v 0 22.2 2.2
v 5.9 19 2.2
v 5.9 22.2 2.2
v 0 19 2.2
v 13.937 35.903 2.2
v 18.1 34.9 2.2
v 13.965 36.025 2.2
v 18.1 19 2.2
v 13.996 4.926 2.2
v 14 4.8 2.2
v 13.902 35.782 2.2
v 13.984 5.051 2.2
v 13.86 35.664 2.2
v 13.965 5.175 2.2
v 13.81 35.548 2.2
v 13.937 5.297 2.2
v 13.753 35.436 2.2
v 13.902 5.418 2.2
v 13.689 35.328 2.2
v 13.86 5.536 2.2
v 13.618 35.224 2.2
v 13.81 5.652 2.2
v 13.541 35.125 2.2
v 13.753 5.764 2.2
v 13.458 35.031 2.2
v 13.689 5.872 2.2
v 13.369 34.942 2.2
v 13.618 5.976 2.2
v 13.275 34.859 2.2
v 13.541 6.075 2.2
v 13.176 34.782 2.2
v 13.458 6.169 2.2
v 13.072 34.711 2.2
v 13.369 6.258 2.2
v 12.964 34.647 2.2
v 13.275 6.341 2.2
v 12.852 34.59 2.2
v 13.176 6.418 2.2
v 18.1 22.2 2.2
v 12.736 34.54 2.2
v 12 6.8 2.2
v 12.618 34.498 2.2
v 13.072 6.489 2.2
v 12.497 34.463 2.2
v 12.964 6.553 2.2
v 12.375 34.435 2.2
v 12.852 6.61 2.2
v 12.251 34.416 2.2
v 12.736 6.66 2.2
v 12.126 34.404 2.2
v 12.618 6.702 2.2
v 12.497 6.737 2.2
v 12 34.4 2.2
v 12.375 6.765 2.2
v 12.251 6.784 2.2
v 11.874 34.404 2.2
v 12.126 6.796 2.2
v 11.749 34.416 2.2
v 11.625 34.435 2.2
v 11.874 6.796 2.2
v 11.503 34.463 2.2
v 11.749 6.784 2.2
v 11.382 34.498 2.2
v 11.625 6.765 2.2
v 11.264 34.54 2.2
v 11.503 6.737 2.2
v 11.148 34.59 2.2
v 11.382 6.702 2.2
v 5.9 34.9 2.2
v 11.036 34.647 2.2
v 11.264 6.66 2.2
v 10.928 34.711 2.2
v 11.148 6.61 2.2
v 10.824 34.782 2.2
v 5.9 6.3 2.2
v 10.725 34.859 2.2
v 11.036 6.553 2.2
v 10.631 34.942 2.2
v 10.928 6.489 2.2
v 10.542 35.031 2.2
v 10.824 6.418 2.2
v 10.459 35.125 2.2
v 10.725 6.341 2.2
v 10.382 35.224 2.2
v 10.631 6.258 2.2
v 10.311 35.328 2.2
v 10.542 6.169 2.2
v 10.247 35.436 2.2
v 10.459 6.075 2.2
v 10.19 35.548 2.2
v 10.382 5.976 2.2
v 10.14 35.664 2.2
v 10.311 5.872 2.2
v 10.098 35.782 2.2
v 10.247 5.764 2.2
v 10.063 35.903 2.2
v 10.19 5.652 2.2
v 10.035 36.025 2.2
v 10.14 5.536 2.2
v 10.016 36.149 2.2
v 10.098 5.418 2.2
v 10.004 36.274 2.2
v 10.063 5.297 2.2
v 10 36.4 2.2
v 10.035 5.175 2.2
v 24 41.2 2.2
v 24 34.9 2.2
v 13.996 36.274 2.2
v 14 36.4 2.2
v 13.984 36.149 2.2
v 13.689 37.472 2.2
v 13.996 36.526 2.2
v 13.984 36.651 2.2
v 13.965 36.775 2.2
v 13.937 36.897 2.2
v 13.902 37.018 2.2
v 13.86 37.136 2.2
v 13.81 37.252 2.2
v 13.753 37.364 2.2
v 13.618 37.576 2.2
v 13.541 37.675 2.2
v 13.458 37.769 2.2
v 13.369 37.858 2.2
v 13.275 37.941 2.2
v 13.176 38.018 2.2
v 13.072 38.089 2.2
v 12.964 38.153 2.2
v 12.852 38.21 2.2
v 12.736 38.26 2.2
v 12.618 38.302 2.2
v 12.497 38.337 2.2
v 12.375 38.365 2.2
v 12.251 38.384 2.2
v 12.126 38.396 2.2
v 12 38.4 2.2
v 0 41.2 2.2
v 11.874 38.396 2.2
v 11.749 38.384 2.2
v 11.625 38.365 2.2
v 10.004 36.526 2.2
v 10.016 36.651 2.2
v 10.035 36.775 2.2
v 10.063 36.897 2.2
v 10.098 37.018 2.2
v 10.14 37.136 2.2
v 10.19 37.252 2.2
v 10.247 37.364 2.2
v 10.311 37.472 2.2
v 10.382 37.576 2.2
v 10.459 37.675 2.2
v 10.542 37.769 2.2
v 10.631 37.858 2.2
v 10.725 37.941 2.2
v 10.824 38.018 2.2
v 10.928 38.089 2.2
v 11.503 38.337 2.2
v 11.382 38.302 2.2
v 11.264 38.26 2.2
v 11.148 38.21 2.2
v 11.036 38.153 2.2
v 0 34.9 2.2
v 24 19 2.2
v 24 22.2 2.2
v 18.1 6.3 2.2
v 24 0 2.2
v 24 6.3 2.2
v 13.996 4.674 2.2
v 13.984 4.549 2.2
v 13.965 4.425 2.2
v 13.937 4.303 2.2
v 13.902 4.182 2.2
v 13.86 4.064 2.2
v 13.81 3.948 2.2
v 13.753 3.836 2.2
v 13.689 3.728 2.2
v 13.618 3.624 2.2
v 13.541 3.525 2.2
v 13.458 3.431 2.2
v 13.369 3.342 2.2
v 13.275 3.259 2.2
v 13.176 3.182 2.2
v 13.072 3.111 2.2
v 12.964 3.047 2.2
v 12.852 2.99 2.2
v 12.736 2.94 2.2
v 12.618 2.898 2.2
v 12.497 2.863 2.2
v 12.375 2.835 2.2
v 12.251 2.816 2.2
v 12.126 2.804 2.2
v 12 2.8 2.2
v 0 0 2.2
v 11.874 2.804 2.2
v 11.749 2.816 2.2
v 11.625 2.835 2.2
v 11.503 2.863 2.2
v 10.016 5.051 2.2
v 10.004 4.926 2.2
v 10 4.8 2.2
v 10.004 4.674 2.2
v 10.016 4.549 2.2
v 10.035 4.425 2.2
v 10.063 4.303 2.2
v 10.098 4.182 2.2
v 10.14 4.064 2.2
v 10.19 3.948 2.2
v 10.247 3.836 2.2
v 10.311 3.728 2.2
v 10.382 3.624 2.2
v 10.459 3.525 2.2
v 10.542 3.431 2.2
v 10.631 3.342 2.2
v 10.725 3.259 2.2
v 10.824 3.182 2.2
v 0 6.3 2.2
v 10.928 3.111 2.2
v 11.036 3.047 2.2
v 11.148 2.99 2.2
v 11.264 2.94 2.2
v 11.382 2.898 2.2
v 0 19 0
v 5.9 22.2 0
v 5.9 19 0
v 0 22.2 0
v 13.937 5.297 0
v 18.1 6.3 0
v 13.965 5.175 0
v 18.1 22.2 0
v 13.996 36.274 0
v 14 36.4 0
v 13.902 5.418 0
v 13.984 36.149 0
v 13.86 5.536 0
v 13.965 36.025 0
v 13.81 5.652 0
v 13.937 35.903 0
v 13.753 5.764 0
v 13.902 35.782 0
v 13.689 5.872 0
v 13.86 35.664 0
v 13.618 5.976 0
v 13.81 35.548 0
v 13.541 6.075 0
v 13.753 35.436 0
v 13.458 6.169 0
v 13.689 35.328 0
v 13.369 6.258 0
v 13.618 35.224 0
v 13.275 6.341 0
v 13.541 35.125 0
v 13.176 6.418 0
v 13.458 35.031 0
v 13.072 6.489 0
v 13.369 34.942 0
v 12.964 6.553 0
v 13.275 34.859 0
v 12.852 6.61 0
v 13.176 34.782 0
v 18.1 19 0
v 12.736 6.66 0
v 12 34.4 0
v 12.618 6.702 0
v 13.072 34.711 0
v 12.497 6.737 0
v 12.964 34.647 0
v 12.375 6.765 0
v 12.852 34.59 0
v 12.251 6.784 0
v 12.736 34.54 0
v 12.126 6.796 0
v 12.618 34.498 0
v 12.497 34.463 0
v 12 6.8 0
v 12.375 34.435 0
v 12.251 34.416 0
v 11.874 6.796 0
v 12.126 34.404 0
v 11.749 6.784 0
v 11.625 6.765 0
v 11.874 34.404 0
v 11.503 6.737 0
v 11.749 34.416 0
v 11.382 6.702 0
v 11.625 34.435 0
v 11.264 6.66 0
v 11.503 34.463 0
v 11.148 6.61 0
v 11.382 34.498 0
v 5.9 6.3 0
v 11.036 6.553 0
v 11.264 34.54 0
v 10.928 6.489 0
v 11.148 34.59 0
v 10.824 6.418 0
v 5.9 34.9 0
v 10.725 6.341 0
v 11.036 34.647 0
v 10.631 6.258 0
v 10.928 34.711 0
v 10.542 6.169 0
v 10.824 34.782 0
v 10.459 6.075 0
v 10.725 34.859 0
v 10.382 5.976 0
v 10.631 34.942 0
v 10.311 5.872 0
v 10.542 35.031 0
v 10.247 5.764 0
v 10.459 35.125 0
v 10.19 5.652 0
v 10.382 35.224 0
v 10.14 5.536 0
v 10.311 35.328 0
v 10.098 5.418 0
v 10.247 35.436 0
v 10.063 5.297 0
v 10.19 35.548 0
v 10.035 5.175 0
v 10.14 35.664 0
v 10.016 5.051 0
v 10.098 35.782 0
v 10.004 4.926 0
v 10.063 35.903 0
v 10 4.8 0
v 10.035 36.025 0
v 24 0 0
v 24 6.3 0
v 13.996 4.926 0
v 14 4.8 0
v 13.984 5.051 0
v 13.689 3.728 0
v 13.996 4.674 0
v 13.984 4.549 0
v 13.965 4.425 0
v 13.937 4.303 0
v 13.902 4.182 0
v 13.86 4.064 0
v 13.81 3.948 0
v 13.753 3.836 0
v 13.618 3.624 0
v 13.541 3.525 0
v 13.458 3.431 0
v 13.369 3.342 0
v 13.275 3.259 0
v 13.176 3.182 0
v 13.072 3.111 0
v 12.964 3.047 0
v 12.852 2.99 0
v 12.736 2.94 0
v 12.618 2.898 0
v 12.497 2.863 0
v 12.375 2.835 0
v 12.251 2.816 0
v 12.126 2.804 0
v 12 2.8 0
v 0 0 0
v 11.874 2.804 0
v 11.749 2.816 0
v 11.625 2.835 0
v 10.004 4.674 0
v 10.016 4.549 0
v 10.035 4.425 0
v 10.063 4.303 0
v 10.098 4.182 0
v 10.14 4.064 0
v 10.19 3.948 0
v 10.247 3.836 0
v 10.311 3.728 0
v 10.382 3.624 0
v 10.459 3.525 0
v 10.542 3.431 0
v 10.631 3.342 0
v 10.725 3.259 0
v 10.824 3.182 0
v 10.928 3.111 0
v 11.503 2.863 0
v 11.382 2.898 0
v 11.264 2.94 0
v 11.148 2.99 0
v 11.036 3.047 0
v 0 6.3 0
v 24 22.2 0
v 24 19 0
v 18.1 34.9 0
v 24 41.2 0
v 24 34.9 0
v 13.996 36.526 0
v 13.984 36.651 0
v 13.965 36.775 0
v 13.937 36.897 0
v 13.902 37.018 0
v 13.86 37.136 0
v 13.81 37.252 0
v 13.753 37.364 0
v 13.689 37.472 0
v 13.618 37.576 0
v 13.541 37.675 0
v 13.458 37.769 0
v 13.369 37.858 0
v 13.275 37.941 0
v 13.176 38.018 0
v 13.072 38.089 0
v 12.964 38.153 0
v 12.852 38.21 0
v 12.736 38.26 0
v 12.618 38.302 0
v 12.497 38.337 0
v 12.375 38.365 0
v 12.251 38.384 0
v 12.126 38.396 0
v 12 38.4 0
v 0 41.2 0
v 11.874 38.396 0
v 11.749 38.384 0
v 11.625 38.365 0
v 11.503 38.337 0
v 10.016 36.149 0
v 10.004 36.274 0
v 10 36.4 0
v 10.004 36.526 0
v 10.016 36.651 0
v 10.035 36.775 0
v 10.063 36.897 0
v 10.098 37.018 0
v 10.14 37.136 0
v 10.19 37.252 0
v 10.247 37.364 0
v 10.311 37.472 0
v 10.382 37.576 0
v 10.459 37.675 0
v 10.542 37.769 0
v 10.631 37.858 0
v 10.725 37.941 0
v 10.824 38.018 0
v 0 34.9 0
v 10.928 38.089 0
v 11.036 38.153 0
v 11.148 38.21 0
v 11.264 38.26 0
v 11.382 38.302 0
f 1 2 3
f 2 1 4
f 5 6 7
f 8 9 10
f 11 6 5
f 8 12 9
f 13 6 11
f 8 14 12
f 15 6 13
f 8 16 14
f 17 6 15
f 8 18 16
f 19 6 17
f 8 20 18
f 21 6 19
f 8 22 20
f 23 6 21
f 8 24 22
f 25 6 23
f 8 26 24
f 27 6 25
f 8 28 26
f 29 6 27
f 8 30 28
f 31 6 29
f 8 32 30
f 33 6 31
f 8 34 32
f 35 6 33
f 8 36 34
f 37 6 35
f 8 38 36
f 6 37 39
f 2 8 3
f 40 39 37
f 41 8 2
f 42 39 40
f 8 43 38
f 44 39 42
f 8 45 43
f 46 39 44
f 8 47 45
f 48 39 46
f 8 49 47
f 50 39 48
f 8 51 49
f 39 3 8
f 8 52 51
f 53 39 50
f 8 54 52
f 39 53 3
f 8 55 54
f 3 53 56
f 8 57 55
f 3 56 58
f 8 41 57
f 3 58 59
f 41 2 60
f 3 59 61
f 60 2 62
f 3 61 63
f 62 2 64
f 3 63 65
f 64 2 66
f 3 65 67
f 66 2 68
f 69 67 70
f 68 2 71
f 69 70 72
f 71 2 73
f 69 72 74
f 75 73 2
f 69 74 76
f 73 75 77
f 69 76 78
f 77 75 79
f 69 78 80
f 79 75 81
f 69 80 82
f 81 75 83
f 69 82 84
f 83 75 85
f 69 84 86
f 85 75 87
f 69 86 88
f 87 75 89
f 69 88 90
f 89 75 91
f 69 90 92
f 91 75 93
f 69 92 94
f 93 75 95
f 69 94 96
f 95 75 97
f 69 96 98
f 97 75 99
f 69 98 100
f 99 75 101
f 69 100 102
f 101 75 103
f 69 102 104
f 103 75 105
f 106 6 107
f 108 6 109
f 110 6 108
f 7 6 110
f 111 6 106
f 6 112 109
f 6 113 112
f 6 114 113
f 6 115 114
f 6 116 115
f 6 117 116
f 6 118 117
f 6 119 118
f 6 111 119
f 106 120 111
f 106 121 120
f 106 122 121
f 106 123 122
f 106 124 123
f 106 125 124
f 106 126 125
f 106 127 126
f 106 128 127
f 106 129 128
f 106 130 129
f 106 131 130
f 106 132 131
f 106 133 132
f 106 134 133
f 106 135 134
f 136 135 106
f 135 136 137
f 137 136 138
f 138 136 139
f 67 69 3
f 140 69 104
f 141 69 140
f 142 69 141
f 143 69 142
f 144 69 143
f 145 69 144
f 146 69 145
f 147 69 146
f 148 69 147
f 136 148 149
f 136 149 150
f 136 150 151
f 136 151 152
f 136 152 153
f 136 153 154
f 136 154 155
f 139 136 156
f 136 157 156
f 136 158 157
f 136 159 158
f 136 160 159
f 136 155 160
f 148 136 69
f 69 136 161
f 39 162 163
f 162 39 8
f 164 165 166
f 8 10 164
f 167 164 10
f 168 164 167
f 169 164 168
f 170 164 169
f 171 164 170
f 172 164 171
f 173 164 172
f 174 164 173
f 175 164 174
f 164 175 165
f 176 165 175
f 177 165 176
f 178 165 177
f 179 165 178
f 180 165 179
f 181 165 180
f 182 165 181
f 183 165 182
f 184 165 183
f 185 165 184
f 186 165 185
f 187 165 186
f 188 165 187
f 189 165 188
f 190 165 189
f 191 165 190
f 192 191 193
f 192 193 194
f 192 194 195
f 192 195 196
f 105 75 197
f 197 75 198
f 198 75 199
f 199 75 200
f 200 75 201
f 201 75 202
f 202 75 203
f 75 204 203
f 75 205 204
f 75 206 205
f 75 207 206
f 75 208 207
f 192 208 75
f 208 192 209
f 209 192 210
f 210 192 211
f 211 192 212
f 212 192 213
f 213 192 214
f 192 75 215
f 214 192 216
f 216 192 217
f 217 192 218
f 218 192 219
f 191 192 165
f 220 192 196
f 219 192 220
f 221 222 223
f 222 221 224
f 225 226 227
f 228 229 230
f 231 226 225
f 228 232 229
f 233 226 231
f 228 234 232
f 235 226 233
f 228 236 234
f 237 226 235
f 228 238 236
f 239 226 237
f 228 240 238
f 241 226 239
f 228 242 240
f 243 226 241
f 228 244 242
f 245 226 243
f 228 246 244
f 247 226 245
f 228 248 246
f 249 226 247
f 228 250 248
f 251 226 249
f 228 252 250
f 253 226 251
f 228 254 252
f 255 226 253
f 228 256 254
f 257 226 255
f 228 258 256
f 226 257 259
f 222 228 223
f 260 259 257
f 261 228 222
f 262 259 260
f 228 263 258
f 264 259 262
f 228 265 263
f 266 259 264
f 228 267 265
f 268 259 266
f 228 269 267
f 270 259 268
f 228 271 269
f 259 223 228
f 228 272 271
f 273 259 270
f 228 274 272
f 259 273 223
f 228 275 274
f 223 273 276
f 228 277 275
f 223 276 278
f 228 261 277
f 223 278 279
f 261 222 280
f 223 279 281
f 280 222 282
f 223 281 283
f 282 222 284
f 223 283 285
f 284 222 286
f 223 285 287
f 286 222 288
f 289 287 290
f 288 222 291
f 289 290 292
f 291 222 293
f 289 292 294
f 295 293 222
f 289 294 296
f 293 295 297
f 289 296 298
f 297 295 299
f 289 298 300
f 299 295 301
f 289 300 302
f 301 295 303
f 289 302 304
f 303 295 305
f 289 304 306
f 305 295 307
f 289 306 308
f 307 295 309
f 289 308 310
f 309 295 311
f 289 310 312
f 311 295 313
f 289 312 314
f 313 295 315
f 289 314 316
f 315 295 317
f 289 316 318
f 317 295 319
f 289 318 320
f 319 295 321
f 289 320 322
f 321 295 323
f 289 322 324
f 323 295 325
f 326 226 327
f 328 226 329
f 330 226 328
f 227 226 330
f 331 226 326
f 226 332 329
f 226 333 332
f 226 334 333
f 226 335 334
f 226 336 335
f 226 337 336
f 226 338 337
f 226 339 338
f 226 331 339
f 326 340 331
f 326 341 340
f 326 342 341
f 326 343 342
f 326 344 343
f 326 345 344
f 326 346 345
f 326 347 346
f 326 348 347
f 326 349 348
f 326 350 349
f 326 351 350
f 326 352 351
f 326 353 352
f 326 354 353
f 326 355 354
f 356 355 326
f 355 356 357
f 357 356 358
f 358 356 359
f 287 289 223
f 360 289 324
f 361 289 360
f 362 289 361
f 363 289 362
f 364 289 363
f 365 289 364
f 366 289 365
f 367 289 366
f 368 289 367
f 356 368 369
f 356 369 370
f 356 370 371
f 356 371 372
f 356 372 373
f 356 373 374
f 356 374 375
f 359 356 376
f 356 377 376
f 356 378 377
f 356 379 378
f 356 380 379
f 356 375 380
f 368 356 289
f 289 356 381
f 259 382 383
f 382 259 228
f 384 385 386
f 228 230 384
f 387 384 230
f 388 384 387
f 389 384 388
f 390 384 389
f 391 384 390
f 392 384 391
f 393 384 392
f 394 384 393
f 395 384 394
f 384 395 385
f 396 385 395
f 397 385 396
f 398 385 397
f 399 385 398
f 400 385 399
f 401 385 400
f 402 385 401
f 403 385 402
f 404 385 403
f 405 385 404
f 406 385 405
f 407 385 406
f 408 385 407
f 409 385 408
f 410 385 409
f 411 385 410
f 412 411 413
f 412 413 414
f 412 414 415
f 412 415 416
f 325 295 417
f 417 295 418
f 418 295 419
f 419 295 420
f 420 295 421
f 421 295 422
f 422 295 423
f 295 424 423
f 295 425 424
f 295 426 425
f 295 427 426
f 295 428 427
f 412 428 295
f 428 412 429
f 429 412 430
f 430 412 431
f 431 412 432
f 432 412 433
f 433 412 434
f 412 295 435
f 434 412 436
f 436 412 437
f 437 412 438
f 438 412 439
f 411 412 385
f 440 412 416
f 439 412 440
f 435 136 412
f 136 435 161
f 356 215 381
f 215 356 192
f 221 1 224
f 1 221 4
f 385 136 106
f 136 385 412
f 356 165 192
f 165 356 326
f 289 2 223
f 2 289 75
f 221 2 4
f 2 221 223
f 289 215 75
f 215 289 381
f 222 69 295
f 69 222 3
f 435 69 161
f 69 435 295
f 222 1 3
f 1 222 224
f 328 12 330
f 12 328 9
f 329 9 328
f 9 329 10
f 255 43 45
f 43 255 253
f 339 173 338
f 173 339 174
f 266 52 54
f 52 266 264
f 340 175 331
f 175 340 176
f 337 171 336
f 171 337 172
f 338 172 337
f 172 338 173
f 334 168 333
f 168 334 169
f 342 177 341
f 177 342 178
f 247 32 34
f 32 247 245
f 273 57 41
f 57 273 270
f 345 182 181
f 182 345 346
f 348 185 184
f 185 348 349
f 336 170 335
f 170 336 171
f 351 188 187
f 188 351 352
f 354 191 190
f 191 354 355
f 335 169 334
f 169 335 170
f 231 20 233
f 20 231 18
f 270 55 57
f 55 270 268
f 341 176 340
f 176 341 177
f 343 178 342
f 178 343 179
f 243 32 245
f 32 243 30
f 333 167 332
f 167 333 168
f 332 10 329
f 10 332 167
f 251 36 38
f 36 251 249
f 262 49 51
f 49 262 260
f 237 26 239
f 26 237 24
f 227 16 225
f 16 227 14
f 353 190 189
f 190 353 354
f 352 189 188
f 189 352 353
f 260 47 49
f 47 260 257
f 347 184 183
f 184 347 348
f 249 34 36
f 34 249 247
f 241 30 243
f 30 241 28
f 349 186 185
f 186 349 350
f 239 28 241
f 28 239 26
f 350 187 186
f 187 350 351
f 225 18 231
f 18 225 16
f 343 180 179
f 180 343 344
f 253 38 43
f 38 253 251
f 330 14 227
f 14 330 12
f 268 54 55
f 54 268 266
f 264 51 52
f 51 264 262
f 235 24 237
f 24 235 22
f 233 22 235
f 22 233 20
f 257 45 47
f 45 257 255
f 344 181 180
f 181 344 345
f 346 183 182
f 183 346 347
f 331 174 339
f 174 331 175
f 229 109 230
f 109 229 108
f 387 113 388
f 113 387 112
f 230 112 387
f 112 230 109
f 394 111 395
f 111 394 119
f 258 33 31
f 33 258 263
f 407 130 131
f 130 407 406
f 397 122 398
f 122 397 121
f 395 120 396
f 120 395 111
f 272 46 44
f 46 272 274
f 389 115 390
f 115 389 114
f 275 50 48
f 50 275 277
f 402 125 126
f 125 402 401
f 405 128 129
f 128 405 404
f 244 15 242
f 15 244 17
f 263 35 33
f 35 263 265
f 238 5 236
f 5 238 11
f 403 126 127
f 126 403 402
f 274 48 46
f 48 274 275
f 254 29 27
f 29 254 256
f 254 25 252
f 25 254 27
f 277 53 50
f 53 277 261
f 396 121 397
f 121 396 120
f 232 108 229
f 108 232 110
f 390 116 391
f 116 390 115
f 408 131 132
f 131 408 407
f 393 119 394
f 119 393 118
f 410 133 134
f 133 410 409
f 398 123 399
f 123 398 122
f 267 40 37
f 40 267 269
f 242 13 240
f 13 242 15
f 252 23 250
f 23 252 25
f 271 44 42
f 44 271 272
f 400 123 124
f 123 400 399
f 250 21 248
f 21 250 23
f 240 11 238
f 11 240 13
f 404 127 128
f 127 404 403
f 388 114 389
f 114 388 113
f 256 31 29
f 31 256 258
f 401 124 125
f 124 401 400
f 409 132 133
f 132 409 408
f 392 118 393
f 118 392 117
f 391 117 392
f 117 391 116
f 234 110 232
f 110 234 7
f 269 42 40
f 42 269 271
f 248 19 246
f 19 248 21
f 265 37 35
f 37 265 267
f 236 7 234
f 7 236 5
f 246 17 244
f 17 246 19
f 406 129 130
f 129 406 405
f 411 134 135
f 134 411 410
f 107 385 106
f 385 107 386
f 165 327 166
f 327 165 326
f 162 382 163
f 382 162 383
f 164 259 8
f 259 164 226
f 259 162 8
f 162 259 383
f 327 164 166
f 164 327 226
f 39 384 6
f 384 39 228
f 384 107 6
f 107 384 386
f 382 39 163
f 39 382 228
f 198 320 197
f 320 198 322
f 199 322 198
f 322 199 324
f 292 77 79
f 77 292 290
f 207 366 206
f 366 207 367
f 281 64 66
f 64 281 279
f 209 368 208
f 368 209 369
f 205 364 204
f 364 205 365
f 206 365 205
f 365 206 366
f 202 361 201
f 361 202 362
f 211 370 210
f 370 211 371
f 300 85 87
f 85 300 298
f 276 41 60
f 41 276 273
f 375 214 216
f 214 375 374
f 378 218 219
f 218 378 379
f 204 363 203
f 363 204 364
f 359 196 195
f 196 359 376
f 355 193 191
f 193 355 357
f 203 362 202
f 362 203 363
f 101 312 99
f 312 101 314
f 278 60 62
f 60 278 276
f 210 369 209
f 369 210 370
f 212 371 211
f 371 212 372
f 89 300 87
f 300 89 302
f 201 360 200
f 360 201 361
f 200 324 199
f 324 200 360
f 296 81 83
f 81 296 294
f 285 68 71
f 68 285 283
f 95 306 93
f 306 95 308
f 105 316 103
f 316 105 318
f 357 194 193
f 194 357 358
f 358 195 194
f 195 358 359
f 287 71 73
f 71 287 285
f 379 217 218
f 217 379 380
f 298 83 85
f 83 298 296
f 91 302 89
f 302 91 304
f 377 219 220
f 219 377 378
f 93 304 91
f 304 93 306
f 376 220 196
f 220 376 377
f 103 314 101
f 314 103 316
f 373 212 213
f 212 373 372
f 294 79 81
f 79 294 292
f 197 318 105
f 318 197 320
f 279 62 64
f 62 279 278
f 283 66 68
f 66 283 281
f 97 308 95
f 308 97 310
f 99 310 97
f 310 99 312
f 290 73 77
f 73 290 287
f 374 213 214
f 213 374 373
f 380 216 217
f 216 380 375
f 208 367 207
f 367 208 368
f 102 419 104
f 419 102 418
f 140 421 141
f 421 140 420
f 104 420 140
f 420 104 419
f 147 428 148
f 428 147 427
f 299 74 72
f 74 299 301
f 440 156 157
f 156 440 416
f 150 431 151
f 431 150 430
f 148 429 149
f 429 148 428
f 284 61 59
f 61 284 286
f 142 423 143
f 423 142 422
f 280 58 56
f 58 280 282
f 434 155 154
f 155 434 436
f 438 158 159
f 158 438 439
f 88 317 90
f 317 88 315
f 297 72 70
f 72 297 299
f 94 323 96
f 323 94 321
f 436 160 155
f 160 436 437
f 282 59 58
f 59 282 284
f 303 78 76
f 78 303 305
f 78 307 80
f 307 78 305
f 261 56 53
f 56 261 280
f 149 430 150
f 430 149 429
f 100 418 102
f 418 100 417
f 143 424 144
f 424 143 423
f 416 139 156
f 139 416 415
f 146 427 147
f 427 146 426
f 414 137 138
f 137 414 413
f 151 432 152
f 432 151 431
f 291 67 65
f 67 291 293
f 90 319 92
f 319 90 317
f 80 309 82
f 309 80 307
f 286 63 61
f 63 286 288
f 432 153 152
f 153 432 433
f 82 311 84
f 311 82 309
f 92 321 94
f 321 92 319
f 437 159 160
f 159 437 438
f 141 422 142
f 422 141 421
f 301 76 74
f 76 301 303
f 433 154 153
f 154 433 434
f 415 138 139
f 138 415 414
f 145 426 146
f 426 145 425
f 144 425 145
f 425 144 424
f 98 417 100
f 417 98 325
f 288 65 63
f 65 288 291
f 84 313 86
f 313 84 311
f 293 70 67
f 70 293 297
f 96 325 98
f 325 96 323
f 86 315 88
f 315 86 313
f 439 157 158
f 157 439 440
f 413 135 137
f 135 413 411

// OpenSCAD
module single() {
	difference() {
		cube(size = [15.7,41.2,2.2], center = false);
		translate(v = [-0.5,6.3,-0.5])
			cube(size = [6.4,12.7,4]);
		translate(v = [-0.5,22.2,-0.5])
			cube(size = [6.4,12.7,4]);
		translate(v=[12,4.8,1])
			cylinder(h=3,r=2, center=true, $fn=100);
		translate(v=[12,36.4,1])
			cylinder(h=3,r=2, center=true, $fn=100);
	}
}

union(){
	single();
	mirror([1,0,0])
		translate(v=[-24,0,0])
			single();
}
